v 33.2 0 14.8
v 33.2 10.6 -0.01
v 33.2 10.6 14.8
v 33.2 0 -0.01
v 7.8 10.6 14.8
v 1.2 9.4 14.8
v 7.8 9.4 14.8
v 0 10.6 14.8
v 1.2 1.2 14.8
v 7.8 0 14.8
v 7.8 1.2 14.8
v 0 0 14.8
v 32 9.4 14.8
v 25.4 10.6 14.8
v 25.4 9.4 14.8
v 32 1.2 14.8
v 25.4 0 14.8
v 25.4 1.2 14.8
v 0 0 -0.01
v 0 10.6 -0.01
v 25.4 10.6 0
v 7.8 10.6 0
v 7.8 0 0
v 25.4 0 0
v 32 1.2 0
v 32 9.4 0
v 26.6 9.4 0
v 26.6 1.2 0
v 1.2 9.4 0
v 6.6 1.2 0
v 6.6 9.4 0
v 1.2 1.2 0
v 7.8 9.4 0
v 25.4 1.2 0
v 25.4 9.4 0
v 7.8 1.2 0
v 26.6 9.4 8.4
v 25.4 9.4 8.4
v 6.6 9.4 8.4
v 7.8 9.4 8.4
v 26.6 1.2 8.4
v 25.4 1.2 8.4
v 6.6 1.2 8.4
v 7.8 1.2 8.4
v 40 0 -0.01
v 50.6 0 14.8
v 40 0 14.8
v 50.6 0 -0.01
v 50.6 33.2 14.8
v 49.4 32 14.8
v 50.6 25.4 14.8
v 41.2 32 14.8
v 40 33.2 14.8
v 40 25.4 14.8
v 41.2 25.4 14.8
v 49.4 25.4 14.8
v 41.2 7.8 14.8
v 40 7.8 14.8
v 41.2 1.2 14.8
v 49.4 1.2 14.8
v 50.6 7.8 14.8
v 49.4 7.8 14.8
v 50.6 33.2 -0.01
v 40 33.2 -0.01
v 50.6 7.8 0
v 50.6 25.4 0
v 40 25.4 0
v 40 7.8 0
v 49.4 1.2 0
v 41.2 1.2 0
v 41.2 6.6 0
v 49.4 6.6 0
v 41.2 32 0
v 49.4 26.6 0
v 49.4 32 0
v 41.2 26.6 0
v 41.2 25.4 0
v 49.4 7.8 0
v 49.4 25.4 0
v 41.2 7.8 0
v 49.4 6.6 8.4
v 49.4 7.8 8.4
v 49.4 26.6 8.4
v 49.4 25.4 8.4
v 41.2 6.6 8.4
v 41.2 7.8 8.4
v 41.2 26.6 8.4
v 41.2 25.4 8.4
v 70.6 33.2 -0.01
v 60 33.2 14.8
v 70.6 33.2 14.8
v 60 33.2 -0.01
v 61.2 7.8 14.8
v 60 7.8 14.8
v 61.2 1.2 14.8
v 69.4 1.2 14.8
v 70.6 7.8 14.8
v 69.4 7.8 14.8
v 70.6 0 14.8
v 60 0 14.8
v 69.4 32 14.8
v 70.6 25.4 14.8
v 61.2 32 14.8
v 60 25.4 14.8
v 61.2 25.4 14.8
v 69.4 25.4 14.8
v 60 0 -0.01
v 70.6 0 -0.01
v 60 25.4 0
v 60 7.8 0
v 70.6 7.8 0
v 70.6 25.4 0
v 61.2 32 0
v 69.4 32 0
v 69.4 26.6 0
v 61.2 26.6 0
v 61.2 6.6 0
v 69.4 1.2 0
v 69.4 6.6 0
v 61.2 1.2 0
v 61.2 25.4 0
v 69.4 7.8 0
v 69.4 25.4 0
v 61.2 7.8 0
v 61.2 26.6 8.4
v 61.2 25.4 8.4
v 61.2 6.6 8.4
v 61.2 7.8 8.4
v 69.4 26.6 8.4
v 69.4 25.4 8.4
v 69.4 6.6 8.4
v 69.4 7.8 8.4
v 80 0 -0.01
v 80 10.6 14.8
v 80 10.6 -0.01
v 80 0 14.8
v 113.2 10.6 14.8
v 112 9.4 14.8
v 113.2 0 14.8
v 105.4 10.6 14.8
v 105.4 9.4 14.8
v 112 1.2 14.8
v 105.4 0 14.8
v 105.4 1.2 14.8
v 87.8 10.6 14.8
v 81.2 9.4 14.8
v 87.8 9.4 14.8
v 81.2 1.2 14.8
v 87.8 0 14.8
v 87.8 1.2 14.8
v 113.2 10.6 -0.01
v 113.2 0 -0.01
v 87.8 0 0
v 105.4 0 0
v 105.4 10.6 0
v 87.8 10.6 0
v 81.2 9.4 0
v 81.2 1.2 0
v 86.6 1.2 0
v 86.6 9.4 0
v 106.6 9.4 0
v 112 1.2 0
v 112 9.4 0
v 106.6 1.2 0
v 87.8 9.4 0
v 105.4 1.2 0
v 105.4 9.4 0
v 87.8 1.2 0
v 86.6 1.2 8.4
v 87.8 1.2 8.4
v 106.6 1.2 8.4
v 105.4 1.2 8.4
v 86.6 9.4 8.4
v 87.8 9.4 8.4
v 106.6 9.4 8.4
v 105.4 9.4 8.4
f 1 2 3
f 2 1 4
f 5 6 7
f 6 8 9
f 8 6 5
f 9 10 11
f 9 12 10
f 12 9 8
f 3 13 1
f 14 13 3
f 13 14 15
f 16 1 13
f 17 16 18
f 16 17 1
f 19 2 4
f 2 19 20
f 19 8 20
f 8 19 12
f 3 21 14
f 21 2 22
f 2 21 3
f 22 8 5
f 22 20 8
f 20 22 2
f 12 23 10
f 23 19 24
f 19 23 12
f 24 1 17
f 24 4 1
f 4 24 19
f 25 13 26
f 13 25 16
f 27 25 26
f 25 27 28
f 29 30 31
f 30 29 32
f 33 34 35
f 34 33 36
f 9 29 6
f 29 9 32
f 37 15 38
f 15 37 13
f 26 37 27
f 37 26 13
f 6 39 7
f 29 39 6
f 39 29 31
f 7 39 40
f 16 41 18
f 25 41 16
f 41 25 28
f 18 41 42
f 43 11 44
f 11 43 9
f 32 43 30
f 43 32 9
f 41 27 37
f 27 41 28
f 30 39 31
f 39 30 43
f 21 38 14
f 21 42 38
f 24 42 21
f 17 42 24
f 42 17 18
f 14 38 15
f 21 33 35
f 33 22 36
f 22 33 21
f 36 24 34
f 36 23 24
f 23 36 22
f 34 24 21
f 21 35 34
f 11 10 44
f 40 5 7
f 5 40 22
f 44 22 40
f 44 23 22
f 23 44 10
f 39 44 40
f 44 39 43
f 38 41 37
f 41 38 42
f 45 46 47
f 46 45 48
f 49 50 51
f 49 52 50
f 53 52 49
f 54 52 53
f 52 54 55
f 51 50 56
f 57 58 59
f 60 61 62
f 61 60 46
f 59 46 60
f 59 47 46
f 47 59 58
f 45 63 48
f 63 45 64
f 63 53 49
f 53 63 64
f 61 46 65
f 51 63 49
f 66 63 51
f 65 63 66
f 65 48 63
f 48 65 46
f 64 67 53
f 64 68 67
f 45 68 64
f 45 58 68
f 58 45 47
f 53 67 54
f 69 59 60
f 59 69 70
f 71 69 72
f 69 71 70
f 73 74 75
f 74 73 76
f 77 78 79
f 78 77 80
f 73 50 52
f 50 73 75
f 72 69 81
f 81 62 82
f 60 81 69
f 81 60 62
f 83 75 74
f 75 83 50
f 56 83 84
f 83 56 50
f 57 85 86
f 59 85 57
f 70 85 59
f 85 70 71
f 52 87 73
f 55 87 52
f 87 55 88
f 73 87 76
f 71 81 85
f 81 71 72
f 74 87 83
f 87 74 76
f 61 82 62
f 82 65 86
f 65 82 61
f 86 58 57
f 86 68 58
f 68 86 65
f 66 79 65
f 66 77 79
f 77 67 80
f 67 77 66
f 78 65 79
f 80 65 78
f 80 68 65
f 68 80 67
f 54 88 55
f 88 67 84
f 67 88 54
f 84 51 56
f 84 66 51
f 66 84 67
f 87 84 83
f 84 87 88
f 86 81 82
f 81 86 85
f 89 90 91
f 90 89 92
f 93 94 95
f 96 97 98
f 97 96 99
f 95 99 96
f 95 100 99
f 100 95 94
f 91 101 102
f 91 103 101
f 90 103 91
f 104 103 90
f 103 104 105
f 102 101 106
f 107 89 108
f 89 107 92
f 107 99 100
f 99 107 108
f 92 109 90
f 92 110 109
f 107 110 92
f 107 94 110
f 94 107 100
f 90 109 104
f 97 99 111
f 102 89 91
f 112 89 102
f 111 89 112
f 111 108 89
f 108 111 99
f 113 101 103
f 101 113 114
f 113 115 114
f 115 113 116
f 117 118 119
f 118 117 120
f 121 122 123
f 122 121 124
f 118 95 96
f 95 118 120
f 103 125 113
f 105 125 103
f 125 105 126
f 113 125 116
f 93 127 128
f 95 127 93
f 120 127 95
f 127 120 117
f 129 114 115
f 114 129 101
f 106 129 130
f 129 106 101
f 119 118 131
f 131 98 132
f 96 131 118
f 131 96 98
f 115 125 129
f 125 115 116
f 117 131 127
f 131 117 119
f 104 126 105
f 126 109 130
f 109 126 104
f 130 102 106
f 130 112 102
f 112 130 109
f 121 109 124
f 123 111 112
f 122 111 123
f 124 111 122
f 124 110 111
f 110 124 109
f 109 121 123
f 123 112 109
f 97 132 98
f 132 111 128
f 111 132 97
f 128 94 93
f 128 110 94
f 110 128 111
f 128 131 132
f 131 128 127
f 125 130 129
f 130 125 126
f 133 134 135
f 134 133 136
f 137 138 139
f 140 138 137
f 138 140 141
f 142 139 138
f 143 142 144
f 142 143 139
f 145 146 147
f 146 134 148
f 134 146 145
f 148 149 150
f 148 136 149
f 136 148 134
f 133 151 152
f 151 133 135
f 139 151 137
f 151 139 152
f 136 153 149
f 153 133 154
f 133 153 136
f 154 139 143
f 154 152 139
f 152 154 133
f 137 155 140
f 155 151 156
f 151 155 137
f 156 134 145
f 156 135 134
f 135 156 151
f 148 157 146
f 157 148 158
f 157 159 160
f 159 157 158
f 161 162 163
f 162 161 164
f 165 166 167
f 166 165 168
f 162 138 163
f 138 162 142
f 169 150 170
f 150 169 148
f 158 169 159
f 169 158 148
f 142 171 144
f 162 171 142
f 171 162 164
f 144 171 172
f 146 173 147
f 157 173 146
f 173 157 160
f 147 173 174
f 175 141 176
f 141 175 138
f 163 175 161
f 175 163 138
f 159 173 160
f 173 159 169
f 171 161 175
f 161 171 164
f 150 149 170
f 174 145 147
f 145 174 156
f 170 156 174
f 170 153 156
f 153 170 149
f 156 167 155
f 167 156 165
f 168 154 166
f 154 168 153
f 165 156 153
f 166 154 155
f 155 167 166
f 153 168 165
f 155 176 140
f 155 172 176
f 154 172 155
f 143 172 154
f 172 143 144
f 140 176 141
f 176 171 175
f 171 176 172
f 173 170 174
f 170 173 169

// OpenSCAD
// file: ../../Base/Boxes.scad
// Fischertechnik Box Foundation
// Pre-designed Boxes

use <Constants.scad>

include <PlacementOptions.scad>

box190Width = 190;
box190Depth = 130;
box130Width = 130;
box130Depth = 95;
boxUsageHeight = 33.9;
boxWallThickness = 2.4;
boxBaseThickness = 1.0;

// getBoxWallThickness()
// Gets the wall thickness of a Fischertechnik Box

function getBoxWallThickness() = boxWallThickness;

// Gets the usable height of a fischertechnik box
function getBoxUsageHeight() = boxUsageHeight;

// Gets the thickness of the Fischertechnik box base.
function getBoxBaseThickness() = boxBaseThickness;

// Gets the usable inner space of a Box 190 as an x/y-list
function getBox190Space() = [
    box190Width - 2*getBoxWallThickness(), 
    box190Depth - 2*getBoxWallThickness() ];

// Imports the Fischertechnik empty box 130x190 mm and places it at position 0,0
// 190x130 are the outer sizes, the inner space is slightly smaller. Use getBox190Space() to get the inner sizes.
// This module needs the STL file "Fischertechnik Box 130x190.stl" in the library path.
// The box is positioned that the usable inner space is at the 0,0,0 position. The

module Box190() {
    translate([-getBoxWallThickness(),-getBoxWallThickness(),-getBoxBaseThickness()])
        import("Fischertechnik Box 130x190.stl", convexity=3);
}

// Gets the usable inner space of a Box 130 as an x/y-list
function getBox130Space() = [
    box130Width - 2*getBoxWallThickness(), 
    box130Depth - 2*getBoxWallThickness() ];

// Imports the Fischertechnik empty box 95x130 mm and places it at position 0,0
// 190x130 are the outer sizes, the inner space is slightly smaller. Use getBox190Space() to get the inner sizes.
// This module needs the STL file "Fischertechnik Box 95x130.stl" in the library path.
// The box is positioned that the usable inner space is at the 0,0,0 position. The

module Box130() {
    translate([-getBoxWallThickness(),-getBoxWallThickness(),-getBoxBaseThickness()])
        import("Fischertechnik Box 95x130.stl", convexity=3);
}

// Creates a web at the specified box walls
// corner 0 = LowerLeft, 1 = UpperLeft, 2 = UpperRight, 3 = LowerRight
// side 0 = LeftOfCorner, 1 = RightOfCorner
// distance = Distance in mm from the corner
// box = inner width and depth of the box (default: Box 190)
// webWidth = length of the web (default is 3 mms)
// webThickness = thickness of the web (default is 1 mm)

module BoxWeb(corner, side, distance, box=getBox190Space(), webWidth=3, webThickness=1.0) {
    sink = getBoxWallThickness()/2;

    width = (corner % 2 == 0) ? 
            (side == LeftOfCorner ? webWidth : webThickness) :
            (side == LeftOfCorner ? webThickness : webWidth);

    depth = (corner % 2 == 0) ? 
            (side == RightOfCorner ? webWidth : webThickness) :
            (side == RightOfCorner ? webThickness : webWidth);
    
    xDiff = corner == LowerLeft ? 
                (side == LeftOfCorner ? -sink : distance) :
            (corner == UpperLeft ?                
                (side == LeftOfCorner ? distance : -sink) :
            (corner == UpperRight ?
                (side == LeftOfCorner ? box.x-webWidth+sink : box.x-distance-webThickness) :
                (side == LeftOfCorner ? box.x-distance-webThickness: box.x-webWidth+sink)));

    yDiff = corner == LowerLeft ? 
                (side == RightOfCorner ? -sink : distance) :
            (corner == UpperLeft ?
                (side == RightOfCorner ? box.y-distance : box.y-webWidth+sink) :
            (corner == UpperRight ?
                (side == RightOfCorner ? box.y-webWidth+sink : box.y-distance) :
                (side == RightOfCorner ? distance : -sink)));
    
    translate([xDiff, yDiff, -getExcess()])
        cube([width, depth, boxUsageHeight + 2*getExcess()]);
}
// file: ../../Base/Rotation.scad
// Fischertechnik Box Foundation
// Geometry Helpers Rotation

include <PlacementOptions.scad>

// getRotatedSpace(space, rotation=NoRotation)
// Rotates the space dependent on the specified rotation

function getRotatedSpace(space, rotation=NoRotation) = [
    (rotation == Rotate90 || rotation == Rotate270) ? space.y : space.x,
    (rotation == Rotate90 || rotation == Rotate270) ? space.x : space.y
];

// Rotates the given space around the fixed left lower corner
// space = the space the children needs as width/depth list [width,depth]
// rotation = 0 Rotate0 degrees, 1 Rotate90 degrees, 2 Rotate180 degrees, 3 Rotate270 degrees (equivalent to -90)

module RotateFix(space, rotation=Rotate0) {
    dy = (rotation == Rotate0 || rotation == Rotate270) ? 0 :
        (rotation == Rotate90) ? space.x :
        space.y;
    dx = (rotation < Rotate180) ? 0 :
        (rotation == Rotate180) ? space.x :
        space.y;
    
    translate([dx, dy, 0])
        rotate([0, 0, rotations[rotation]])
            children();
}
// file: ../../Base/Alignment.scad
// Fischertechnik Box Foundation
// Geometry Helpers Alignment

include <PlacementOptions.scad>

// getAlignedX(elementWidth, spaceWidth, align=AlignRight, offset=0)
// Gets the aligned X offset of an element with the given
// width in the given space.
// elementWidth = The width of the element to positon
// spaceWidth = The space where the element should be aligned
// align = 0 AlignLeft, 1 AlignCenter, 2 AlignRight
// offset = an optional offset from the aligned position. When
// aligned left or centered, then positive values are in X direction.
// When aligned right then positive values are in negative X direction.

function getAlignedX(elementWidth, spaceWidth, align=AlignRight, offset=0) =
    (align == AlignLeft) ?
        offset :
        ((align == AlignCenter) ?
        (spaceWidth - elementWidth)/2 + offset :
        spaceWidth - offset - elementWidth);

// getAlignedY(elementDepth, spaceDepth, align=AlignTop, offset=0)
// Gets the aligned Y offset of an element with the given
// depth in the given space.
// elementDepth = The depth of the element to positon
// spaceDepth = The space where the element should be aligned
// align = 0 AlignBottom, 1 AlignCenter, 2 AlignTop
// offset = an optional offset from the aligned position. When
// aligned bottom or centered, then positive values are in Y direction.
// When aligned top then positive values are in negative Y direction.

function getAlignedY(elementDepth, spaceDepth, align=AlignTop, offset=0) =
    (align == AlignBottom) ?
        offset :
        ((align == AlignCenter) ?
        (spaceDepth - elementDepth)/2 + offset :
        spaceDepth - offset - elementDepth);
// file: ../../Base/Constants.scad
// Fischertechnik Box Foundation
// Constants

// Constant values necessary for multiple elements

// Base constants
dividerThickness = 1.2;
excess = 0.01;
fragments = 90;
tolerance = 0.8;

// Gets the thickness of a divider 
function getDividerThickness() = dividerThickness;

// Gets the excess that is used to merge walls into each other
function getExcess() = excess;

// Gets amount of fragments of a cylinder
function getFragments() = fragments;

// Gets the inner tolerance of a frame to each side
function getTolerance() = tolerance;


// Fischertechnik specific constants
axisDiameter = 4;
axisBottomDiameter = axisDiameter + 1;
standardEdgeDistance = 2.5;
standardWebDistance = 11.5;
standardCornerLength = 15;
tubeWallFactor = 1.6;

// Gets axis diameter
function getAxisDiameter() = axisDiameter;

// Gets axis bottom diameter for thicker part at the bottom
function getAxisBottomDiameter() = axisBottomDiameter;

// gets the standard distance to the wall of the box for dockable frames with webs
function getStandardEdgeDistance() = standardEdgeDistance;

// gets the standard distance of each web to the corner of the dockable frame
function getStandardWebDistance() = standardWebDistance;

// gets the standard length of the corner walls of a dockable frame
function getStandardCornerLength() = standardCornerLength;

// gets the wall thickness of a tube.
function getTubeWallThickness() = tubeWallFactor * getDividerThickness();
// file: ../../Base/PlacementOptions.scad
// Fischertechnik Box Foundation
// Placement Options

// Alignment
NoAlign = 0;
AlignLeft = 1;
AlignBottom = 2;
AlignCenter = 3;
AlignRight = 4;
AlignTop = 5;

// Element rotation degree steps
rotations = [0, -90, -180, -270];

// Rotation
NoRotation = 0;
Rotate0 = 0;
Rotate90 = 1;
Rotate180 = 2;
Rotate270 = 3;

// Docking (seen from above)
NoDock = -1;
DockLeft = 0;
DockTop = 1;
DockRight = 2;
DockCorner = 2;
DockBottom = 3;

// Web corners
LowerLeft = 0;
UpperLeft = 1;
UpperRight = 2;
LowerRight = 3;

// Web position relative to corner
LeftOfCorner = 0;
RightOfCorner = 1;
// file: ../../Elements/FrameTwoConnectors30.scad
// Fischertechnik Box Library
// Frame for two Connectors 30
// 31061

use <../ModelBase/Complex.scad>

width = 30;
depth = 8.2;
height = 14.8;

// getFrameTwoConnectors30Space()
// Gets the space needed for the frame for two struts.
function getFrameTwoConnectors30Space() = getElevatedFramesWithCutoffSpace([width, depth, height]);

// FrameTwoConnectors30()
// Frame for two connectors 30

module FrameTwoConnectors30() {    
    bearingLength = 6.6;
    loadHeight = 6.4;
    
    ElevatedFramesWithCutoff([width, depth, loadHeight], depth, height, bearingLength);
}

// Test
color("lightgray")
FrameTwoConnectors30();
// file: ../../Base/Placement.scad
// Fischertechnik Box Foundation
// Geometry Helpers Placement

use <Constants.scad>
use <Alignment.scad>
use <Rotation.scad>
use <Boxes.scad>

include <PlacementOptions.scad>

// Place(x=0, y=0, elementSpace=[0,0], alignX=AlignLeft, alignY=AlignBottom, rotation=Rotate0, boxSpace=getBox190Space())
// Places the child at the specified position
// y = Y-Position. This is a relative position when an X aligment is specified.
// x = X-Position. This is a relative position when an Y aligment is specified.
// elementSpace = space of the element to be placed [x,y]
// alignX = -1=NoAlign, 0 AlignLeft, 1 AlignCenter, 3 AlignRight (elementSpace and boxSpace required!)
// alignY = -1=NoAlign, 2 AlignBottom, 1 AlignCenter, 4 AlignTop (elementSpace and boxSpace required!)
// rotation = 0 Rotate0 0 degrees, 1 Rotate90 90 degrees, 
// 2 Rotate180 180 degrees, 3 Rotate270 270 degrees (equivalent to -90)
// boxSpace = Inner space of the box where the placement occurs [x,y] - default is Box 190x130 inner space

module Place(x=0, y=0, elementSpace=[0,0], 
  alignX=AlignLeft, alignY=AlignBottom, 
  rotation=NoRotation, boxSpace=getBox190Space()) {

    module Position(x, y, space, rotation=Rotate0) {
        translate([x, y, 0])
            RotateFix(space, rotation)
                children(0);
    }

    space = getRotatedSpace(elementSpace, rotation);
    alignedX = getAlignedX(space.x, boxSpace.x, alignX, x);
    alignedY = getAlignedY(space.y, boxSpace.y, alignY, y);
    Position(alignedX, alignedY, elementSpace, rotation)
        children(0);
}

// Center(space=getBox130Space(), elementSpace=[0,0])
// space = Space where the children is centered. For cylinder use centered=true and no elementSpace.
// elementSpace = space of the element to be centered [x,y]

module Center(space=getBox190Space(), elementSpace=[0,0]) {
    translate([(space.x - elementSpace.x) / 2, (space.y - elementSpace.y) / 2])
        children(0);
}

// CenterHorizontal(width=0, y=0, offset=0, space=getBox130Space())
// space = Space where the children is centered. For cylinder use centered=true and no elementSpace.
// elementSpace = space of the element to be centered [x,y]

module CenterHorizontal(width=0, y=0, offset=0, space=getBox190Space()) {
    translate([(space.x - width) / 2 + offset, y])
        children(0);
}

// CenterVertical(depth=0, x=0, offset=0, space=getBox130Space())
// space = Space where the children is centered. For cylinder use centered=true and no elementSpace.
// elementSpace = space of the element to be centered [x,y]

module CenterVerticalal(depth=0, x=0, offset=0, space=getBox190Space()) {
    translate([x, (space.y - depth) / 2 + offset])
        children(0);
}
// main file
// Fischertechnik Box Foundation
// Elements
// Test FrameTwoConnectors30

use <../../Base/Placement.scad>
use <../../Elements/FrameTwoConnectors30.scad>

include <../../Base/PlacementOptions.scad>

FrameTwoConnectors30();

Place(40, 0, getFrameTwoConnectors30Space(), rotation=Rotate90)
    FrameTwoConnectors30();

Place(60, 0, getFrameTwoConnectors30Space(), rotation=Rotate270)
    FrameTwoConnectors30();

Place(80, 0, getFrameTwoConnectors30Space(), rotation=Rotate180)
    FrameTwoConnectors30();
